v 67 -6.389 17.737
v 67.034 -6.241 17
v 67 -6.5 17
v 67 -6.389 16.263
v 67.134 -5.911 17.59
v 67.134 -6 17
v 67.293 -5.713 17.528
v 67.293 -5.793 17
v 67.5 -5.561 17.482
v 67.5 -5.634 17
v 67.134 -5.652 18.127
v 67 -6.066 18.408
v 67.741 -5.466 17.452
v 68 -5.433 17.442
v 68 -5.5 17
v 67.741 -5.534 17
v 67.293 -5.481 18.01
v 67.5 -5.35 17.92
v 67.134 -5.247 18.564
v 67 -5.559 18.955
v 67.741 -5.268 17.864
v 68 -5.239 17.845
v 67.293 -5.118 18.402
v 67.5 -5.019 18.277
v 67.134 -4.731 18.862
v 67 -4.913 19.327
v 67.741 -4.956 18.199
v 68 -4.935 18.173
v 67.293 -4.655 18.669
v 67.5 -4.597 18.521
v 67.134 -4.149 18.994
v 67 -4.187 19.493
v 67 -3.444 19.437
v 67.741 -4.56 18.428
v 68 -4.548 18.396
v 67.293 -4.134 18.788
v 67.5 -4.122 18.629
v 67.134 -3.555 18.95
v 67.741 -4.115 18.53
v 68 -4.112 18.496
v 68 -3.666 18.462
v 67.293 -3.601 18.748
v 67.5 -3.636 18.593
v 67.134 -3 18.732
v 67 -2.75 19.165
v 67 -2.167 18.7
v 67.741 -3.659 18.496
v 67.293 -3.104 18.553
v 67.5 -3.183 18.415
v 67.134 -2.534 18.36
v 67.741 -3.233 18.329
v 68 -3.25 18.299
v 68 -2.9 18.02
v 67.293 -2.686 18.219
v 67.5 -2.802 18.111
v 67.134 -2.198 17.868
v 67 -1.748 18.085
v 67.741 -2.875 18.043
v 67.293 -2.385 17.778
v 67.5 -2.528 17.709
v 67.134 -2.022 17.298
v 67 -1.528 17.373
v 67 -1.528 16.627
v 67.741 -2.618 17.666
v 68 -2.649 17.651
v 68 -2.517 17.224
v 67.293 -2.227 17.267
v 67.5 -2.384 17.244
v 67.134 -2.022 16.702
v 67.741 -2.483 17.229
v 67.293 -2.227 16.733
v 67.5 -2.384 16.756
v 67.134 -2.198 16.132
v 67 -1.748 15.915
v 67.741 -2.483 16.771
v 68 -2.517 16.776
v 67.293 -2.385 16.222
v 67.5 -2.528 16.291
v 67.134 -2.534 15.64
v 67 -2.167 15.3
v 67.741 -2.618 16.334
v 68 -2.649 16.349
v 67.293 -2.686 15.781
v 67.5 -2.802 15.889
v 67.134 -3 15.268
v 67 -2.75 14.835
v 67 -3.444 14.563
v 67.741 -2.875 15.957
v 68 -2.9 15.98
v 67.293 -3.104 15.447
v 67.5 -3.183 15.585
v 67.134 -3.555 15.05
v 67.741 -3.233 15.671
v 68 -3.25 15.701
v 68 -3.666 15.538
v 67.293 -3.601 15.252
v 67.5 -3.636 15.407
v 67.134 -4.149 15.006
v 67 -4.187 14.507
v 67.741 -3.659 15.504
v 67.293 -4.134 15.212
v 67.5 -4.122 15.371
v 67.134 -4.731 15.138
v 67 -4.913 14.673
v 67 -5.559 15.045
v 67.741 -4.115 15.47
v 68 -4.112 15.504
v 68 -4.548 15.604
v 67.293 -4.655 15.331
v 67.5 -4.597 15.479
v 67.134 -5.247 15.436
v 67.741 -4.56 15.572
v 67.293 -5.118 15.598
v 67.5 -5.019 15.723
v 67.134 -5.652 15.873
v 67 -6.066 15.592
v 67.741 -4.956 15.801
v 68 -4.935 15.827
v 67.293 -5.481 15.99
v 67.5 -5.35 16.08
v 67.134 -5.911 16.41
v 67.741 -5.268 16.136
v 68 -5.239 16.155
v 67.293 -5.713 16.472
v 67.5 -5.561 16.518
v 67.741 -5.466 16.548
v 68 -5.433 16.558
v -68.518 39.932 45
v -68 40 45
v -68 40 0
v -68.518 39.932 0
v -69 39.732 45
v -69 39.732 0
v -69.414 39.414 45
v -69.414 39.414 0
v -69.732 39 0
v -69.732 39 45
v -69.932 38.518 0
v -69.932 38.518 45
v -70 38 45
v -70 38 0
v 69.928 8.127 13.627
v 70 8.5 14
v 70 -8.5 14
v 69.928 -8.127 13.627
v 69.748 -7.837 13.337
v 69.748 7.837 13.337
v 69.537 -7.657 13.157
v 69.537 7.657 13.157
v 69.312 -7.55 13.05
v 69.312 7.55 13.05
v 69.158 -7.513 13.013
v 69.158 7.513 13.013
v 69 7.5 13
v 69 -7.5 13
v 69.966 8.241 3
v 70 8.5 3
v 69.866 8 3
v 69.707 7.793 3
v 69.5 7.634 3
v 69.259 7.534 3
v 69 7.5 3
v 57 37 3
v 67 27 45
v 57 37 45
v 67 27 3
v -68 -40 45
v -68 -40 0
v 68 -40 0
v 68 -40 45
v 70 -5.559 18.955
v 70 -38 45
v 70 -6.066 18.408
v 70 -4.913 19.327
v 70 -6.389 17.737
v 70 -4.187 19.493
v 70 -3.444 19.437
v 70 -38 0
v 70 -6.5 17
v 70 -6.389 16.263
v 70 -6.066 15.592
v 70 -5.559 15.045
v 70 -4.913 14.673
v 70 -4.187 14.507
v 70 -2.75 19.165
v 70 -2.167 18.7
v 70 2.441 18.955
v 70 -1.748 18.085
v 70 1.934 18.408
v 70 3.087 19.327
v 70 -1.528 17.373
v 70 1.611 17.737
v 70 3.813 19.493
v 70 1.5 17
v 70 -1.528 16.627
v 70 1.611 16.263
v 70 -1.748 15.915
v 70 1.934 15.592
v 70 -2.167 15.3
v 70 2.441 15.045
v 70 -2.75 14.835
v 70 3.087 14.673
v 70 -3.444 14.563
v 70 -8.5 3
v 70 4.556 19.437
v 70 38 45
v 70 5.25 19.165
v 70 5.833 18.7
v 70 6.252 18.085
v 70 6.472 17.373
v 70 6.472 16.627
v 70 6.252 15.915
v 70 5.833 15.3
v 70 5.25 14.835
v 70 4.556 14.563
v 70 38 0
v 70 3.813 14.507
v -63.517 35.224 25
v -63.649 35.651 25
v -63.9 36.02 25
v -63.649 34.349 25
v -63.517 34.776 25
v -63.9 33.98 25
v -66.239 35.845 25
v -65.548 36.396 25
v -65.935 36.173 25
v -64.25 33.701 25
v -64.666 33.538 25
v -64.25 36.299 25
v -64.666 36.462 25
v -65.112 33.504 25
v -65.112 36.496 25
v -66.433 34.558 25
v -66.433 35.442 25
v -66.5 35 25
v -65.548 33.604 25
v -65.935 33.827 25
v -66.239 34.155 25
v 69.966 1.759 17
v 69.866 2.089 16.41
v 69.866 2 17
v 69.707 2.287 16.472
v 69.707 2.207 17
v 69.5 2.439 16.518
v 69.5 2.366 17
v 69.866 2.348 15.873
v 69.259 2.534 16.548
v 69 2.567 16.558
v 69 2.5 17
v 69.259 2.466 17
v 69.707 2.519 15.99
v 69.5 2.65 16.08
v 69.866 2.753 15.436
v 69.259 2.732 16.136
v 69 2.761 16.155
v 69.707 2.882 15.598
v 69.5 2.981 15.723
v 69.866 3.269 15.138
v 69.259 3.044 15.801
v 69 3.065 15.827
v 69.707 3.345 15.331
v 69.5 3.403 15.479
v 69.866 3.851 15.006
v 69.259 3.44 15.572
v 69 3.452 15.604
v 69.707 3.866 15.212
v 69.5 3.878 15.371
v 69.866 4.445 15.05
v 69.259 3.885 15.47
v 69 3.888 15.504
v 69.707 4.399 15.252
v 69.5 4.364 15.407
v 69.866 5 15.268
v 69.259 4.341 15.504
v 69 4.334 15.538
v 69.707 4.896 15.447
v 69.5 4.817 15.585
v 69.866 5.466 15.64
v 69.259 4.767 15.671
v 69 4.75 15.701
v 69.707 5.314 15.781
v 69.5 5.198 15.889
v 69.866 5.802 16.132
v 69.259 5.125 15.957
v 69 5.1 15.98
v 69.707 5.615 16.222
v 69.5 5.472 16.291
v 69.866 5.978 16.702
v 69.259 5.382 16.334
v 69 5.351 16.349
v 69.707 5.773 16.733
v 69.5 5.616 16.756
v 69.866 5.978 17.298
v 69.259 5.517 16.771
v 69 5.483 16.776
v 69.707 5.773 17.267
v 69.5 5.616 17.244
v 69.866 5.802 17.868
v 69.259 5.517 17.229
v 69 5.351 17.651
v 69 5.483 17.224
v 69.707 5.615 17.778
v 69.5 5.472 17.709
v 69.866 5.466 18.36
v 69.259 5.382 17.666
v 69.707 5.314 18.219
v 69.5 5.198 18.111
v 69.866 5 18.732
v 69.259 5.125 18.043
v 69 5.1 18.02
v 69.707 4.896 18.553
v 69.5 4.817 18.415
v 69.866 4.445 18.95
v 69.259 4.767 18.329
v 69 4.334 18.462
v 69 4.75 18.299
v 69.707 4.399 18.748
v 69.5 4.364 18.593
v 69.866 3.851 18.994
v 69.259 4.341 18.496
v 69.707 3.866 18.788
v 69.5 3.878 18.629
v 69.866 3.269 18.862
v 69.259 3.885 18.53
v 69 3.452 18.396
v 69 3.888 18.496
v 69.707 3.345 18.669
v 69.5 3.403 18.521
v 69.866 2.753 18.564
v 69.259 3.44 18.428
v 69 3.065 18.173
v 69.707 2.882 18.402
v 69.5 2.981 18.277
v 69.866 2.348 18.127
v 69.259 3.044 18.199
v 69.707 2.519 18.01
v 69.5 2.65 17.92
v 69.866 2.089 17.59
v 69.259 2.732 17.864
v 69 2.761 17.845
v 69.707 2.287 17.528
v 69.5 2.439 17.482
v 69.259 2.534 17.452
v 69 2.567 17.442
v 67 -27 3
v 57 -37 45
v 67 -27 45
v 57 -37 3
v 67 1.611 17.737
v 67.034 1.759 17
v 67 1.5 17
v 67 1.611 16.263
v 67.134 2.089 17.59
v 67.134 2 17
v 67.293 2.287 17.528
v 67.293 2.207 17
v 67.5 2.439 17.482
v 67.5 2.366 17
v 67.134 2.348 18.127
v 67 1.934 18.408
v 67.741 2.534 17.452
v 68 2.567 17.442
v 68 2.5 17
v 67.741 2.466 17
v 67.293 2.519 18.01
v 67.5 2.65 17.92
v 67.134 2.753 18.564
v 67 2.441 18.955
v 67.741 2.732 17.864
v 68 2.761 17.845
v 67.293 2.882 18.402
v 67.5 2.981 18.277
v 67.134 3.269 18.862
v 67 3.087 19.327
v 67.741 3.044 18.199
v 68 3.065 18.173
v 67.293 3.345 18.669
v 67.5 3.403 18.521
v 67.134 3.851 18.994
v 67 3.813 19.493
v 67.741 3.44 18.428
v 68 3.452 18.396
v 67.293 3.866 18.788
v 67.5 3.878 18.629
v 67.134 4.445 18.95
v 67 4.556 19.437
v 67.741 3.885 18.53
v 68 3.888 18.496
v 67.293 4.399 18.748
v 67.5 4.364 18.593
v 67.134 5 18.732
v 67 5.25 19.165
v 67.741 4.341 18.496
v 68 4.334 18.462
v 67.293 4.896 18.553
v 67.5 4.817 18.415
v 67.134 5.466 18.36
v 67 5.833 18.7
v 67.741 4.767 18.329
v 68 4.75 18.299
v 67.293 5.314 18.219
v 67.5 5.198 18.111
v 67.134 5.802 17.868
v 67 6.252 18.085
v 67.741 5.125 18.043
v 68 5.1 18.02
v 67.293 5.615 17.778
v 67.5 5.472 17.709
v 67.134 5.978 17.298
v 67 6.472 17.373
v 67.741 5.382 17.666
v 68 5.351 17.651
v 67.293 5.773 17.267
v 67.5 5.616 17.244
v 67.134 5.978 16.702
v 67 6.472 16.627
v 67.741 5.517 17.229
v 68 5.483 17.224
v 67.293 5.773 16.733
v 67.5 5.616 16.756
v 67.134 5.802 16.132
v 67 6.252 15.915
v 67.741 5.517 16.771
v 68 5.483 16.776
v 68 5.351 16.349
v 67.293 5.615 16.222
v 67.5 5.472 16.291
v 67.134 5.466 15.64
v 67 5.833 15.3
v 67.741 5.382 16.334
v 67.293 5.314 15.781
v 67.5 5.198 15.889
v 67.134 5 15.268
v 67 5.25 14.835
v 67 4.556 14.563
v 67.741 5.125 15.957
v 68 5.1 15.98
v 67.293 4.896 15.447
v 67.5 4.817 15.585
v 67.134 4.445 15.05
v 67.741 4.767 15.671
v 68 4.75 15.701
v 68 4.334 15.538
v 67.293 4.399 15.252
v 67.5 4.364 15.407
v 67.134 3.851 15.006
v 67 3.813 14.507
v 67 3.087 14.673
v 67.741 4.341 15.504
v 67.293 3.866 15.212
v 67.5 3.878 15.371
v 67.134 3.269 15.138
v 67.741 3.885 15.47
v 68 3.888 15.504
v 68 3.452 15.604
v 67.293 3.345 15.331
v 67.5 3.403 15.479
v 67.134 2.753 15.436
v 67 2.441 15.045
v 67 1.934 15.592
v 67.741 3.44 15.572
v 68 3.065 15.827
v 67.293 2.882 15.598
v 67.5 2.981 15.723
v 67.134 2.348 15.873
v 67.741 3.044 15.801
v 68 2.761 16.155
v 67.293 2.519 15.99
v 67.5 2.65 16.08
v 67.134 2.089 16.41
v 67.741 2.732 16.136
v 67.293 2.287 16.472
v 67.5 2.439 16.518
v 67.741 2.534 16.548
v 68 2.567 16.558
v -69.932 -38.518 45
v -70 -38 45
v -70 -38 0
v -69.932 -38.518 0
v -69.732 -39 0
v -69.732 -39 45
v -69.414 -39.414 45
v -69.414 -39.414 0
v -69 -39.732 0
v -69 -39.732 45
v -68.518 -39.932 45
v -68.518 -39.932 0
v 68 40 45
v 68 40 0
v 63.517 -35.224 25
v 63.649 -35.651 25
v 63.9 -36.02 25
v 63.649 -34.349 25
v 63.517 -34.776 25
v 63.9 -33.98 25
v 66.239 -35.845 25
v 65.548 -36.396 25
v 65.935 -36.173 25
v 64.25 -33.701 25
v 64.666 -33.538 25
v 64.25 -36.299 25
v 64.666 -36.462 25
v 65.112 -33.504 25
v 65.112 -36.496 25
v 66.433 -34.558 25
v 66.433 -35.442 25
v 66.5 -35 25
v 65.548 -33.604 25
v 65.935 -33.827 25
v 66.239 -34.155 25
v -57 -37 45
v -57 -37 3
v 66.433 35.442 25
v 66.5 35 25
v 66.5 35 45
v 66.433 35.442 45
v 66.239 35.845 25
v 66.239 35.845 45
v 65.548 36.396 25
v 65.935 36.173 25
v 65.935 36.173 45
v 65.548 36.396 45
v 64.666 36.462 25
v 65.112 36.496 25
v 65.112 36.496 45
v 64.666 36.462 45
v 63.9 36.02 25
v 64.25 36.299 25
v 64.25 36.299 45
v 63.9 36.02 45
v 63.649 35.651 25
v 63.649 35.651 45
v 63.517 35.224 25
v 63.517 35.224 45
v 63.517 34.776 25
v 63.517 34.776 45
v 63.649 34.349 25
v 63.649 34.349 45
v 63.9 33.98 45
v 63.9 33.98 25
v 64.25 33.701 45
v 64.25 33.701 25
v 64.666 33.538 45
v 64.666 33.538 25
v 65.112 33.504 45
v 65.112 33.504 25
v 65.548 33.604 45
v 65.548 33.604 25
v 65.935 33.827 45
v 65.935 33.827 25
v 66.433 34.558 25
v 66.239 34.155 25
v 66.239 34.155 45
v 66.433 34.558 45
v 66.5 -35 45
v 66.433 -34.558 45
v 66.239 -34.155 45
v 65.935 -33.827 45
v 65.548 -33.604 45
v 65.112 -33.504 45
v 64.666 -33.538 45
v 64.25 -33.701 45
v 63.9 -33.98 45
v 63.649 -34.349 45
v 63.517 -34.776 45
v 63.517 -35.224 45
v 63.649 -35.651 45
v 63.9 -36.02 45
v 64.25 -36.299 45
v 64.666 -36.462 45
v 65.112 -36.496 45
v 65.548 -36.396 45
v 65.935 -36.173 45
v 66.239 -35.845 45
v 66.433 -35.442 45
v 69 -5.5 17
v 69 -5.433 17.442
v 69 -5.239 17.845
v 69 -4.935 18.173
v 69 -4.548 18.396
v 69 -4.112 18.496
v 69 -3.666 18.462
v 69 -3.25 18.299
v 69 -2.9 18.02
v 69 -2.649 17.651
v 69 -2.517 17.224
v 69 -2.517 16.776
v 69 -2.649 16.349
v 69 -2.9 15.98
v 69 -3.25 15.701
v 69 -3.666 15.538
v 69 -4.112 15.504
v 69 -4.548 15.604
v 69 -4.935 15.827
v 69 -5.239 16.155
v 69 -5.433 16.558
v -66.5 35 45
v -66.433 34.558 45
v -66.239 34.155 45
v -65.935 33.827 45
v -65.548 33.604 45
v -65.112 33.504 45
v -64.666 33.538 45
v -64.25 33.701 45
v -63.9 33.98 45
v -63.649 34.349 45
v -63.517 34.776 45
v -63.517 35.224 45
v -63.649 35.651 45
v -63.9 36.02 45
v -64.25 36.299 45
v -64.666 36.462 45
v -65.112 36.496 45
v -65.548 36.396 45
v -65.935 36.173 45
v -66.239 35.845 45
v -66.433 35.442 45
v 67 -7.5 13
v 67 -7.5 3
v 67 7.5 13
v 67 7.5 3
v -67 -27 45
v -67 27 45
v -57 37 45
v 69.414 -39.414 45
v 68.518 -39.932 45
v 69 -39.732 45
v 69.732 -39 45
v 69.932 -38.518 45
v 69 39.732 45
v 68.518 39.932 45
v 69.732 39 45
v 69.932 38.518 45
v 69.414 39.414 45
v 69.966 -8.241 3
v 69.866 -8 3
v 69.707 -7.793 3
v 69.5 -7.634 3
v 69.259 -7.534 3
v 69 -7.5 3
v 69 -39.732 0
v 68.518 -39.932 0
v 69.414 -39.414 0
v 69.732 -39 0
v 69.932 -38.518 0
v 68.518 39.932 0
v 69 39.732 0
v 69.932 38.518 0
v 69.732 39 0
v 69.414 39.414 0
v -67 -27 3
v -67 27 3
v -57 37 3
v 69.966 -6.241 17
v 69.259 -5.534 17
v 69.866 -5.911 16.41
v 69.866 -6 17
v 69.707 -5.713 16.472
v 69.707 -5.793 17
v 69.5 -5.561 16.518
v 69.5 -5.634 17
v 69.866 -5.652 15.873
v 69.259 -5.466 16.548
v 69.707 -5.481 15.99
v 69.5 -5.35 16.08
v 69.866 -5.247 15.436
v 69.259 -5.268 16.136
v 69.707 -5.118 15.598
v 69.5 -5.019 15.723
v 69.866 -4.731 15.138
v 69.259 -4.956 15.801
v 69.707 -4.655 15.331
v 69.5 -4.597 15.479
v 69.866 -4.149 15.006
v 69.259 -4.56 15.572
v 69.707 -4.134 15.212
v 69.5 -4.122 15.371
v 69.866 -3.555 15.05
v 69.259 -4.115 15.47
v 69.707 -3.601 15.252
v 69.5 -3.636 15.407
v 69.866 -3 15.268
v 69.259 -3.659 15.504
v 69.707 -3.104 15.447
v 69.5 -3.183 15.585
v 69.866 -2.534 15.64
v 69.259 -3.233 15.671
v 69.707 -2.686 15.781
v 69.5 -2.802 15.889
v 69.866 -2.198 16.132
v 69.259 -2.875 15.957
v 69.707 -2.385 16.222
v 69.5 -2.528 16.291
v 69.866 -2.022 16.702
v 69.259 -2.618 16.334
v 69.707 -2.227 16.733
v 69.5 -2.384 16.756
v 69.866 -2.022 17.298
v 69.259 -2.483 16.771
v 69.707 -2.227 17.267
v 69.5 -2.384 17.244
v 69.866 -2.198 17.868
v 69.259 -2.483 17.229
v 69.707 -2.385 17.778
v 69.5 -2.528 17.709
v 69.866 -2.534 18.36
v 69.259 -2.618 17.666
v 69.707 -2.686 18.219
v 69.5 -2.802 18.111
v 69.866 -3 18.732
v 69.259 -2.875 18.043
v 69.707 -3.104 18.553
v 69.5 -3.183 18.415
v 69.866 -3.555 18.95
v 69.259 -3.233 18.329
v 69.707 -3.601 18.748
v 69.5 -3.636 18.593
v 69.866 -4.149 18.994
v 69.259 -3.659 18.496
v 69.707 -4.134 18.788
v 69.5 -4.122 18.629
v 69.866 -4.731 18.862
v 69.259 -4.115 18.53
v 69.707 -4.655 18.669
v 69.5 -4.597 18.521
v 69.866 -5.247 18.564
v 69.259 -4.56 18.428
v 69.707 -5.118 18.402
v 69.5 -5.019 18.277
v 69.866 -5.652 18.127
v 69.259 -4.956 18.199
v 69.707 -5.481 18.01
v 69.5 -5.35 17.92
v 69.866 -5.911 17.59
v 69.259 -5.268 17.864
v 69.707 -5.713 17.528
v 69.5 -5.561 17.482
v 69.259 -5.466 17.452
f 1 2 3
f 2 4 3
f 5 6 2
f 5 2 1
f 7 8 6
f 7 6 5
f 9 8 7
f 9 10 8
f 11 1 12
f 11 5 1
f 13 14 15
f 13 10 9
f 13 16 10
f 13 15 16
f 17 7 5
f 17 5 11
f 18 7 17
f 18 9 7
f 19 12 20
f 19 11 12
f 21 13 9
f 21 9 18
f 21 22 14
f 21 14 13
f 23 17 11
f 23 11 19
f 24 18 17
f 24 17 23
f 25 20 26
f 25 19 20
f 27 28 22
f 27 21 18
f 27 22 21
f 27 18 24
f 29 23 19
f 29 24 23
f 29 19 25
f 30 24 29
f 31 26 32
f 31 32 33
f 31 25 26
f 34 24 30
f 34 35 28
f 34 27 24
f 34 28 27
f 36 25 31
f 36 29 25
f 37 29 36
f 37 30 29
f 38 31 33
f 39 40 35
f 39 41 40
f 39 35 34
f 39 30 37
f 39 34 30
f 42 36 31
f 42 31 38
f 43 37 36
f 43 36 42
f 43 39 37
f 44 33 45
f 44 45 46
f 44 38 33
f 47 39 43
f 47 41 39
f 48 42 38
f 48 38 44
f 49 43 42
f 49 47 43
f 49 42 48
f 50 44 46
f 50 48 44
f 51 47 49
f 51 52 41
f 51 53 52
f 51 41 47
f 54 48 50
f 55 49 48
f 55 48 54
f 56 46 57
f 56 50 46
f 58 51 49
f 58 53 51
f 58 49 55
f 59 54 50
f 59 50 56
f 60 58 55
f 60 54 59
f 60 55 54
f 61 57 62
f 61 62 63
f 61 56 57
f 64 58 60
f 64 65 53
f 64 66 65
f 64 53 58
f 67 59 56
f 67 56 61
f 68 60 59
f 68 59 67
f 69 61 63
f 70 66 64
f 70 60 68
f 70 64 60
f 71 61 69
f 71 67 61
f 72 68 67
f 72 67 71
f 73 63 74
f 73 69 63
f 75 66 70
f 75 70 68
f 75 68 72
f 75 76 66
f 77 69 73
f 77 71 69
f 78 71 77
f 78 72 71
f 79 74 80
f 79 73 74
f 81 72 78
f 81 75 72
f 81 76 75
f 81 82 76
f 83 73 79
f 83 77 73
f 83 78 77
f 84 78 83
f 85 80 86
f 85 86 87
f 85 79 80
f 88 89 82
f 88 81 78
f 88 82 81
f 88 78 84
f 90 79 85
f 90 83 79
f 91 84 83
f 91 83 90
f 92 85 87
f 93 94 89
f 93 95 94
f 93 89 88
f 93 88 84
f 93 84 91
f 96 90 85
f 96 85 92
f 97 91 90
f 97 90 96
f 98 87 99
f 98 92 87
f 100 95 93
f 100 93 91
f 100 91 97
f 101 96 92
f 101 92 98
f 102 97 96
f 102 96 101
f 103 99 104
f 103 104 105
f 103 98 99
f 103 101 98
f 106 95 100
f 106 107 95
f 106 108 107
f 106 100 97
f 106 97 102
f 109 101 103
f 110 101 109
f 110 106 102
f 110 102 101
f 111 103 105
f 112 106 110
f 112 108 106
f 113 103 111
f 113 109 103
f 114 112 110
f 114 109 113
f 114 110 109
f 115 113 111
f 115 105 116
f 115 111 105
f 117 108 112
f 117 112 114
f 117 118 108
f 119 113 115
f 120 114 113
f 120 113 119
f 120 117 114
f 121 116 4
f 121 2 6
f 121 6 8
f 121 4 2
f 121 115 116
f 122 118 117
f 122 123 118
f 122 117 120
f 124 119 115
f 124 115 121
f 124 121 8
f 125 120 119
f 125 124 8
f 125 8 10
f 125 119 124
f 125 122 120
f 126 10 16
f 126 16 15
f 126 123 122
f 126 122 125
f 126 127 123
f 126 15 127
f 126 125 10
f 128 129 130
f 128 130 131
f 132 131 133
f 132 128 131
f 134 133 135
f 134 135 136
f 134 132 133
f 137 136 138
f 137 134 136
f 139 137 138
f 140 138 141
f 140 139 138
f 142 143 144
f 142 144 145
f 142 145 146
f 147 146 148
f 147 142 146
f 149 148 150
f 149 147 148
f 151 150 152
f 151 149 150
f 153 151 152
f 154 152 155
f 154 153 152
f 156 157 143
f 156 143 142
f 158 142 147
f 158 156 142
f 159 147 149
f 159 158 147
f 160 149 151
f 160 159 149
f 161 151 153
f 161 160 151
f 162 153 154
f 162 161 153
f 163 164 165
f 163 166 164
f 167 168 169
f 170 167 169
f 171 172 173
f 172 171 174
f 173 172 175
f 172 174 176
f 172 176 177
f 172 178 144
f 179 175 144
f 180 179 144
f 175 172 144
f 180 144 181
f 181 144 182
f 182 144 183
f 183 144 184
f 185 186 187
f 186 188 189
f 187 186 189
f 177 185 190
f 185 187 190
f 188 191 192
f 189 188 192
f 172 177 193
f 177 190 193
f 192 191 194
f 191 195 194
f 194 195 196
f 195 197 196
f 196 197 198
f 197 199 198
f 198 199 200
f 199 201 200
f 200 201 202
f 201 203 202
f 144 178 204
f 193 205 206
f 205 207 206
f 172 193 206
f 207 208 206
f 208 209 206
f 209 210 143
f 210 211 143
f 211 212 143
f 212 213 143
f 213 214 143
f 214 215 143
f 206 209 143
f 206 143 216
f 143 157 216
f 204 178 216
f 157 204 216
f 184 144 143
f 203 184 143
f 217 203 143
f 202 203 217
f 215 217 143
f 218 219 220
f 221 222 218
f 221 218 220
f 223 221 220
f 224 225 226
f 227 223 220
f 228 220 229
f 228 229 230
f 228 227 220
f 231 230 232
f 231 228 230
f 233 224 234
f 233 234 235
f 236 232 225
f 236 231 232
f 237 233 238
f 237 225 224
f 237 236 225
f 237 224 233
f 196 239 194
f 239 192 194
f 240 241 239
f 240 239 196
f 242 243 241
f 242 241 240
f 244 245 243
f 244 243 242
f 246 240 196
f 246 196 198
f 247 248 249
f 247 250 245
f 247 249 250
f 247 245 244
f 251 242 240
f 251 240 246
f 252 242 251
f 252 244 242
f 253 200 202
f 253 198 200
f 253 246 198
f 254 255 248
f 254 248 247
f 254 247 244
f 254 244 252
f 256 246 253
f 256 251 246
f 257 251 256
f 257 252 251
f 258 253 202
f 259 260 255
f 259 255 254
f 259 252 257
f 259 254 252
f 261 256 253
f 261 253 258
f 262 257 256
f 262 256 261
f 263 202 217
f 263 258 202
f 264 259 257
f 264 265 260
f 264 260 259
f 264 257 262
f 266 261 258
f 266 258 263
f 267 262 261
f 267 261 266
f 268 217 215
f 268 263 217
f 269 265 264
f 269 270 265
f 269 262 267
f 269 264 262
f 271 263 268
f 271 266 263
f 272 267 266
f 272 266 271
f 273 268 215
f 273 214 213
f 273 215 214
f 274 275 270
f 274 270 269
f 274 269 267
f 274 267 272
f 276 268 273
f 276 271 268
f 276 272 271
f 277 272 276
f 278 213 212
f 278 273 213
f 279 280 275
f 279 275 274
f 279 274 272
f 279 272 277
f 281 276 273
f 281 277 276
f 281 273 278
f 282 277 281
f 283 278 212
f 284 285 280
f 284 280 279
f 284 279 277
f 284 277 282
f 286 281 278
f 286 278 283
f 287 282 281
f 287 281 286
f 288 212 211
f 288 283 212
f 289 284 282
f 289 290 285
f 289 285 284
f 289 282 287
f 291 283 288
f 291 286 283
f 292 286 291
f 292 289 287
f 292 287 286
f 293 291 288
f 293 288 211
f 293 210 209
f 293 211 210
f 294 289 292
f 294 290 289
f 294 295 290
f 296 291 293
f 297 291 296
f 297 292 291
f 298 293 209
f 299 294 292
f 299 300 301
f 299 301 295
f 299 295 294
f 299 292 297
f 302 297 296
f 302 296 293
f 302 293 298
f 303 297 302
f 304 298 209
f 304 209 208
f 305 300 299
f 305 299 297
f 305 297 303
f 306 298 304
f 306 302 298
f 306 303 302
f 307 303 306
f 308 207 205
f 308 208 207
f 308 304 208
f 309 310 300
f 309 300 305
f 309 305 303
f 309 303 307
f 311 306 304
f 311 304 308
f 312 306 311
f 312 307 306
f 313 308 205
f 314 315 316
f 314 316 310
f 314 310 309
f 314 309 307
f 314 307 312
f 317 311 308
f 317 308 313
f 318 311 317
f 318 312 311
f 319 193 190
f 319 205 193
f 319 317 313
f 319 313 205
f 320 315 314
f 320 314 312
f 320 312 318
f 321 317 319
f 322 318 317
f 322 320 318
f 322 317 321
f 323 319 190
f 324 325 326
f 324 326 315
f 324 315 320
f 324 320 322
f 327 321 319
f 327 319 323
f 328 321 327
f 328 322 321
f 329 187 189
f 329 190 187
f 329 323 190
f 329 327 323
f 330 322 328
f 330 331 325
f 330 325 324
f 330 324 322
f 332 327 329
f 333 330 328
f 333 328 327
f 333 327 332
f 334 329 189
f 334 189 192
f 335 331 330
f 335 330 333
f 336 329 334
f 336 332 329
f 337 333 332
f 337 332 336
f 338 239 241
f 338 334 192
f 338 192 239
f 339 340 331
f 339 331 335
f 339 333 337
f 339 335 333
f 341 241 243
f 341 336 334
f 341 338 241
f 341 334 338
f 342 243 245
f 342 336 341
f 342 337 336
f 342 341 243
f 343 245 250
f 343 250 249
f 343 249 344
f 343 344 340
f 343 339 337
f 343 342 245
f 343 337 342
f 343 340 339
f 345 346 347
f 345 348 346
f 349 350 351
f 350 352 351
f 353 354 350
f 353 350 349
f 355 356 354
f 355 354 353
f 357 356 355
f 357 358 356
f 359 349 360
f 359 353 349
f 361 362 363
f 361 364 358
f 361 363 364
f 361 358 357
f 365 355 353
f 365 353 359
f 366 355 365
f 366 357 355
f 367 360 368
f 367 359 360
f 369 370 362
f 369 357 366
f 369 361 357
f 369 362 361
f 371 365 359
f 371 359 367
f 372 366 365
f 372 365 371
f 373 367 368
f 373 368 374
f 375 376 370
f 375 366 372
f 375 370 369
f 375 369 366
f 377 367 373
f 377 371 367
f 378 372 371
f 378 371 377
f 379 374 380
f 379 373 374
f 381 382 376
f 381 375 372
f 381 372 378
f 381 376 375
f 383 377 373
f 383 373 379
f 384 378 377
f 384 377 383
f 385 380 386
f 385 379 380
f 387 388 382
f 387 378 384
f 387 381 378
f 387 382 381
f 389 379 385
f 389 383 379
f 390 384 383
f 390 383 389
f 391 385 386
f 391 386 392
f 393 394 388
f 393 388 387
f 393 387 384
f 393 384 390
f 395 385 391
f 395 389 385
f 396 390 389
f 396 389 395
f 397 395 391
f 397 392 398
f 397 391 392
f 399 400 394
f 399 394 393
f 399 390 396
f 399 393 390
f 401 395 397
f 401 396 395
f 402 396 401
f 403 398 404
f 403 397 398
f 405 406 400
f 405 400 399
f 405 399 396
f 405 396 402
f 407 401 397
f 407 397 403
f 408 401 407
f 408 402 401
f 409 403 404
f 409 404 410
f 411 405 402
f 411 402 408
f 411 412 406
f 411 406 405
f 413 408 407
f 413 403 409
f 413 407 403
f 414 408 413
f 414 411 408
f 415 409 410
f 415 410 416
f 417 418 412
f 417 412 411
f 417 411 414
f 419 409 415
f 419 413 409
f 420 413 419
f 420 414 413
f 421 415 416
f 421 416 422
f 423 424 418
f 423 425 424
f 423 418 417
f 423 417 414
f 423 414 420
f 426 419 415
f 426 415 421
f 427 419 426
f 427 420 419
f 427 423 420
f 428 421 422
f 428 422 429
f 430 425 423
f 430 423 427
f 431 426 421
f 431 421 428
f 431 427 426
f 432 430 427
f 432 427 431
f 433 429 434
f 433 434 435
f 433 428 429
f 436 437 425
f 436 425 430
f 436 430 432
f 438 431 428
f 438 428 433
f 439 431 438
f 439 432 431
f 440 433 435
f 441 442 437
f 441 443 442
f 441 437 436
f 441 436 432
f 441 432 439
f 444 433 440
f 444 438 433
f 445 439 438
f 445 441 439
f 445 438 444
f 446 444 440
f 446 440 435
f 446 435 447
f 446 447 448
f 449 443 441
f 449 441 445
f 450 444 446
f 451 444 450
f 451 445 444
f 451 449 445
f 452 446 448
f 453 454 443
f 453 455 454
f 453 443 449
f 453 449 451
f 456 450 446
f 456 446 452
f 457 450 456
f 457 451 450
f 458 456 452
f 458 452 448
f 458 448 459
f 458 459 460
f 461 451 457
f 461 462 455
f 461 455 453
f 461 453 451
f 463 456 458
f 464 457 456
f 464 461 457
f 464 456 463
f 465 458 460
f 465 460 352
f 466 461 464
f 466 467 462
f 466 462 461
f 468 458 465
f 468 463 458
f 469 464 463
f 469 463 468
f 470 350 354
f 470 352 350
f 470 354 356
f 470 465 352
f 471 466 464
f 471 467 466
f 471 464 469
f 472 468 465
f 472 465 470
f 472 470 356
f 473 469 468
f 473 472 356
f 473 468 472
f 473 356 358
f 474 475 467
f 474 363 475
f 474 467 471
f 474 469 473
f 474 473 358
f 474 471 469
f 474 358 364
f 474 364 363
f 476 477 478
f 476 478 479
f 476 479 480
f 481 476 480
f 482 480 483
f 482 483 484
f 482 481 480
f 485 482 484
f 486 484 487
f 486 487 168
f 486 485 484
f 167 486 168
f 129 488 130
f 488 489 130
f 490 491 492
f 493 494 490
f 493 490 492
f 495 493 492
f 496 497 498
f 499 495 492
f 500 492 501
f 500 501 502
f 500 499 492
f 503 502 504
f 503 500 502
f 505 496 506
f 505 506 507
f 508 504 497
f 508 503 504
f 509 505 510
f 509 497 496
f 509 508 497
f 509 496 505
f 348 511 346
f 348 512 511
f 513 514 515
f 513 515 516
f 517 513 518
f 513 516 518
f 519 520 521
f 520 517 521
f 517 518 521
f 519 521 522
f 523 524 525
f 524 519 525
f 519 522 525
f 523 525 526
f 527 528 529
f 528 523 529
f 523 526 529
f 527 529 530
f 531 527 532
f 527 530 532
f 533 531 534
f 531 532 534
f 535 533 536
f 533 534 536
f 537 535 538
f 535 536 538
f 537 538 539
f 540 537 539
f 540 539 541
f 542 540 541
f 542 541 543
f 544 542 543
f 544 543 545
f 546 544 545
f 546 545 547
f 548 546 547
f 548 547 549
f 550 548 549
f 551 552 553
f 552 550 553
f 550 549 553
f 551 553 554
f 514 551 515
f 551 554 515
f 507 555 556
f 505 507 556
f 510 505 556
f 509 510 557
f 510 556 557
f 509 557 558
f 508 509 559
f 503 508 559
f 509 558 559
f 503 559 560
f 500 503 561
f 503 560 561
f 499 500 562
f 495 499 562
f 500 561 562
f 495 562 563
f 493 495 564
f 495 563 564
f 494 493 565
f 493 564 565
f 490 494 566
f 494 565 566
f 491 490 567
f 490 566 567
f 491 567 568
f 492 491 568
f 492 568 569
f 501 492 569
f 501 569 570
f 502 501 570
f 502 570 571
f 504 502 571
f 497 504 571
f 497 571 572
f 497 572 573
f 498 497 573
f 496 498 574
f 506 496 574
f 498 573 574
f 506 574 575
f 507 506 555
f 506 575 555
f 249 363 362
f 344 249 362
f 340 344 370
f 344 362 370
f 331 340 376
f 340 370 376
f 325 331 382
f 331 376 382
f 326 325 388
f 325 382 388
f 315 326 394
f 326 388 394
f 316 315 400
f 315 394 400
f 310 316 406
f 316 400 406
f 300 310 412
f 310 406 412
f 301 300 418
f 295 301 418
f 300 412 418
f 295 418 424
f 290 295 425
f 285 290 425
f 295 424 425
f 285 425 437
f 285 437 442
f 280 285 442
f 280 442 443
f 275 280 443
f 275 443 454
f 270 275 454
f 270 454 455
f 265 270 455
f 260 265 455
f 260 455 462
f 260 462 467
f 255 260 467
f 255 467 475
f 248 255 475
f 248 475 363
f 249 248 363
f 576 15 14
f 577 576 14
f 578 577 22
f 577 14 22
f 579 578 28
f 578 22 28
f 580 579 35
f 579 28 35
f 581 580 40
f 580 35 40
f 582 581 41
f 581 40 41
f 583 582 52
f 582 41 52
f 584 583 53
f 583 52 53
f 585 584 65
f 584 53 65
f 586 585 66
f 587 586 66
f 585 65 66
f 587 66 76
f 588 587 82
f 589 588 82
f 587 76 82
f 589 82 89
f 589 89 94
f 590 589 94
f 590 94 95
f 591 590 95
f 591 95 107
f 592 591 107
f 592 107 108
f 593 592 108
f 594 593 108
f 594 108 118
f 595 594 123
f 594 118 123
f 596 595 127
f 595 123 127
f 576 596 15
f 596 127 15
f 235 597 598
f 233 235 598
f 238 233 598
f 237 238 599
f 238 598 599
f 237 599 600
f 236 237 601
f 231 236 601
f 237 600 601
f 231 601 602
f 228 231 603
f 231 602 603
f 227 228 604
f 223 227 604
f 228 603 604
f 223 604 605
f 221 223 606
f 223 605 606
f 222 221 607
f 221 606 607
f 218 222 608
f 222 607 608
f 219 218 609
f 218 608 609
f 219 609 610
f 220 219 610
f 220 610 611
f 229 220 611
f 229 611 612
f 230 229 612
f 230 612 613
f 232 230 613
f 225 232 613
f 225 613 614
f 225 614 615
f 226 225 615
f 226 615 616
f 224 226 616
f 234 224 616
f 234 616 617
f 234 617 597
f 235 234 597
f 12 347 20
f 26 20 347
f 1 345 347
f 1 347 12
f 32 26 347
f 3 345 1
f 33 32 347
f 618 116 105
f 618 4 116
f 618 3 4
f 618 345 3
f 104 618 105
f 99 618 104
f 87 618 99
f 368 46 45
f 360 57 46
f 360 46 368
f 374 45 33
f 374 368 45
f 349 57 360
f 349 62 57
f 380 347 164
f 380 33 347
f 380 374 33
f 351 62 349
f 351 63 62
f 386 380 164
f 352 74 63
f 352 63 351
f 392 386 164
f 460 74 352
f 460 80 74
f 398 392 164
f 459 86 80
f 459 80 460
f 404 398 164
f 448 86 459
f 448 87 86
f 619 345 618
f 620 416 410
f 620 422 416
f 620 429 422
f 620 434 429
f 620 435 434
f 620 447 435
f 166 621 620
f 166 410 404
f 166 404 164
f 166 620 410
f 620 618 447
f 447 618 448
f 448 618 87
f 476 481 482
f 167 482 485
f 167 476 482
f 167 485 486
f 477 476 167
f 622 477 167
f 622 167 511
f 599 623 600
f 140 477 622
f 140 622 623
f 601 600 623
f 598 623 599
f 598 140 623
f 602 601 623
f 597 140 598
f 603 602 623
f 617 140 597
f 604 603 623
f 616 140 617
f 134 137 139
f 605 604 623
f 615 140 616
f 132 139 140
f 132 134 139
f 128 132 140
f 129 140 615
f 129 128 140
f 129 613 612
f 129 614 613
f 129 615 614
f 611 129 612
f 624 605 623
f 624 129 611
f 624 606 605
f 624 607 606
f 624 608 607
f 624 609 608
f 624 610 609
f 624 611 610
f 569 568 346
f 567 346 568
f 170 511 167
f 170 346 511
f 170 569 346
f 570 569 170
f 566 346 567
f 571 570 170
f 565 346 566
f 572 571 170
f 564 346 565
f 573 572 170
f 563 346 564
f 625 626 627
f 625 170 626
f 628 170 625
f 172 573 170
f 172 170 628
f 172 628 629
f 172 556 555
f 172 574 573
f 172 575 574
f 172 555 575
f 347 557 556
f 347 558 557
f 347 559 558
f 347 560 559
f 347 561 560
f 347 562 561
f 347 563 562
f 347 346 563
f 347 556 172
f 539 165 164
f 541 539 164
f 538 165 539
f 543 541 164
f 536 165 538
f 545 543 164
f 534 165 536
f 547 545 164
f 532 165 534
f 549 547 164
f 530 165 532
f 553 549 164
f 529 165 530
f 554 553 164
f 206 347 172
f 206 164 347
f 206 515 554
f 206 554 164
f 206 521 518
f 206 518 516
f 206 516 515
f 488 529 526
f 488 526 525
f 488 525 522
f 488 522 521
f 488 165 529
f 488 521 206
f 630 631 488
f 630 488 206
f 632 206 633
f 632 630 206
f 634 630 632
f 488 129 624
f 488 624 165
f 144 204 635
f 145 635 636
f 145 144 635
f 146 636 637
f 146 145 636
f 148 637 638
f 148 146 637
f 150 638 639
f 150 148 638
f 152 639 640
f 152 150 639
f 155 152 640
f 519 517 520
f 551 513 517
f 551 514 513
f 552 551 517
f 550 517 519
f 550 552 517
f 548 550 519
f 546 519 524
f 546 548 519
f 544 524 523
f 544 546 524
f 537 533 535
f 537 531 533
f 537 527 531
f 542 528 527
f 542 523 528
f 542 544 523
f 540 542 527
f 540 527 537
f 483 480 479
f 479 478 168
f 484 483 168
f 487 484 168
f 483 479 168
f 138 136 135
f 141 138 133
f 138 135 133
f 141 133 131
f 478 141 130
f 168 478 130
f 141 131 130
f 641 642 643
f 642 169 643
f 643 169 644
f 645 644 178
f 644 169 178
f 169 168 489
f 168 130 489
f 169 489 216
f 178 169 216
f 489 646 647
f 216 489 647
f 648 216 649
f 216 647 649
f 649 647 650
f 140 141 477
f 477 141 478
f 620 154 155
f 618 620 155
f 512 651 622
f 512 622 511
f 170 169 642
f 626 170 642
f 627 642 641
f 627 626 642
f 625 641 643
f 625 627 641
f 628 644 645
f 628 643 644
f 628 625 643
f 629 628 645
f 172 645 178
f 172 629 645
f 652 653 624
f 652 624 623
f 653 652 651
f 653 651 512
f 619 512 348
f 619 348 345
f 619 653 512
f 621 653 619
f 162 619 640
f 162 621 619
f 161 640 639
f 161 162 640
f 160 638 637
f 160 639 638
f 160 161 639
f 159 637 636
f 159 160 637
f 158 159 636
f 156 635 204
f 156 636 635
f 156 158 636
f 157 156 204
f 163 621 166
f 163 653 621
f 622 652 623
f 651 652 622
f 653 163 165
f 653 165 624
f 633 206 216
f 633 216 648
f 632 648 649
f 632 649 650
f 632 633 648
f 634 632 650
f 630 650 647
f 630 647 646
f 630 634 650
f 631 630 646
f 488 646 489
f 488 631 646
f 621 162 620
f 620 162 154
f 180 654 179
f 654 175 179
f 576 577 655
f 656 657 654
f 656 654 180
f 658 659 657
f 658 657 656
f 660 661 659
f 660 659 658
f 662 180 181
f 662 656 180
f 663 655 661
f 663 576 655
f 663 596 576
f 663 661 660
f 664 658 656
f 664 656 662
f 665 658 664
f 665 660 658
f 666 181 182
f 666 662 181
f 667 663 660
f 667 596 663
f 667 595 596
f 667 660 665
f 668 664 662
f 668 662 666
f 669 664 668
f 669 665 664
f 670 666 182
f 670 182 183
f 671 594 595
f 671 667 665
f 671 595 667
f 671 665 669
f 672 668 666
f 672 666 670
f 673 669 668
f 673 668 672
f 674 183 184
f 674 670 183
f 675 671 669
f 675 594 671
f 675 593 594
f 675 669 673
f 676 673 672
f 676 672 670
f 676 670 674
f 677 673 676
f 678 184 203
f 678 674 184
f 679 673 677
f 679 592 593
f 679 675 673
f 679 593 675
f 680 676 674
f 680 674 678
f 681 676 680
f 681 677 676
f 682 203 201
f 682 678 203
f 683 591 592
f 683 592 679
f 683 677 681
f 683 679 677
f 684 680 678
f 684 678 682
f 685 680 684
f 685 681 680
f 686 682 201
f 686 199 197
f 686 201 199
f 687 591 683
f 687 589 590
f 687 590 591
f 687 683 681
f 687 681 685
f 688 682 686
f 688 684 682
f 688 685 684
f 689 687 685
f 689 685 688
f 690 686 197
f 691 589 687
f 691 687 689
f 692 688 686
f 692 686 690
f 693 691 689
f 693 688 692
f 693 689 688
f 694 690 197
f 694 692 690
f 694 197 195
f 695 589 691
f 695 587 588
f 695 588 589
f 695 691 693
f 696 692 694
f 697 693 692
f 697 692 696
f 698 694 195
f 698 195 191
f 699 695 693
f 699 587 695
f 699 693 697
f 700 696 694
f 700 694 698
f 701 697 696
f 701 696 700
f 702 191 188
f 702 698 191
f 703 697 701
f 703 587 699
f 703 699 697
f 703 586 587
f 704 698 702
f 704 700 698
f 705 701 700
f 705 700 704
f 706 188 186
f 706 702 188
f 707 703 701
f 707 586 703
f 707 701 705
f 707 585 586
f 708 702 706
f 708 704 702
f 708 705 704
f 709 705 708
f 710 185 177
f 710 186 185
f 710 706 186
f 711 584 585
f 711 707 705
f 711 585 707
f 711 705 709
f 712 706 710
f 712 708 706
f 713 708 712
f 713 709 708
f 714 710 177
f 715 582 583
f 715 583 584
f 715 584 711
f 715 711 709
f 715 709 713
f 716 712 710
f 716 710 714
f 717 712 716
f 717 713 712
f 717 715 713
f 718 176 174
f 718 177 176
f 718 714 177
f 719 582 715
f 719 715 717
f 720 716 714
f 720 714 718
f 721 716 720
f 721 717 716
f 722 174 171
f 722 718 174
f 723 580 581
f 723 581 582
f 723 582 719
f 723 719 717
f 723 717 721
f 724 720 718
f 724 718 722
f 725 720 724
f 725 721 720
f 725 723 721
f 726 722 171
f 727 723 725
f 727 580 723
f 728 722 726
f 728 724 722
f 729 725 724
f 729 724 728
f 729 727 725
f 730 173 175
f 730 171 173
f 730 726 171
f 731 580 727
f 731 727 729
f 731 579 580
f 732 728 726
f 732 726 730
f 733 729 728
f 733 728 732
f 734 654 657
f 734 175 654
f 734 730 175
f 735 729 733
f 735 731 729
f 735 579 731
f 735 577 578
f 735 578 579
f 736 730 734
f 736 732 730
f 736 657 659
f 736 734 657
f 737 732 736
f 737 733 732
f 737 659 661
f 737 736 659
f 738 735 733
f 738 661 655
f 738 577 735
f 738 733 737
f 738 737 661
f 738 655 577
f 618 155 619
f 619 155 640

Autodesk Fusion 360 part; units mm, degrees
sketch "Sketch1" plane through (0, 0, 0) normal (0, 0, 1) x (1, 0, 0)
  line L0 (67, 37) -> (-67, 37)
  line L1 (-67, 37) -> (-67, -37)
  line L2 (-67, -37) -> (67, -37)
  line L3 (67, -37) -> (67, 37)
  line L4 (67, 37) -> (-67, -37) construction
  line L5 (-67, 37) -> (67, -37) construction
  line L6 (70, 40) -> (-70, 40)
  line L7 (-70, 40) -> (-70, -40)
  line L8 (-70, -40) -> (70, -40)
  line L9 (70, -40) -> (70, 40)
  line L10 (70, 40) -> (-70, -40) construction
  line L11 (-70, 40) -> (70, -40) construction
  dimension "d1" = 3
  dimension "d2" = 3
  dimension "d3" = 140
  dimension "d4" = 80
extrude "Extrude1" add sketch "Sketch1" along normal blind 45
sketch "Sketch2" plane through (0, 0, 0) normal (0, 0, 1) x (1, 0, 0)
  line L0 (-67, 37) -> (67, 37)
  line L1 (67, 37) -> (67, -37)
  line L2 (67, -37) -> (-67, -37)
  line L3 (-67, -37) -> (-67, 37)
  point P0 (-67, 37)
  point P1 (67, -37)
extrude "Extrude2" add sketch "Sketch2" along normal blind 3
sketch "Sketch3" plane through (0, 0, 3) normal (0, 0, 1) x (-1, 0, 0)
  line L0 (67, 37) -> (-67, 37)
  line L1 (-67, 37) -> (-67, -37)
  line L2 (-67, -37) -> (67, -37)
  line L3 (67, -37) -> (67, 37)
  line L4 (57, -37) -> (67, -27)
  line L5 (67, -27) -> (67, -37)
  line L6 (57, -37) -> (67, -37)
  dimension "d11" = 10
  dimension "d12" = 10
extrude "Extrude3" add sketch "Sketch3" along normal up to surface (42 mm away) contours L2 L3 L4 L5 L6
sketch "Sketch5" plane through (0, 0, 45) normal (0, 0, 1) x (-1, 0, 0)
  line L0 (-67, -37) -> (-67, 37)
  line L1 (-67, 37) -> (67, 37)
  line L2 (67, 37) -> (67, -27)
  line L3 (67, -27) -> (57, -37)
  line L4 (57, -37) -> (-67, -37)
  line L5 (-70, 40) -> (-70, -40)
  line L6 (-70, -40) -> (70, -40)
  line L7 (70, -40) -> (70, 40)
  line L8 (70, 40) -> (-70, 40)
  circle A0 centre (65, -35) radius 1.5
  line L9 (0, -1.75) -> (0, -22.5)
  line L10 (-1.75, 0) -> (-22.5, 0)
  dimension "d18" = 3
  dimension "d19" = 65
  dimension "d20" = 35
extrude "Extrude5" cut sketch "Sketch5" against normal blind 20 contours A0
mirror "Mirror1" about plane through (0, 0, 0) normal (1, 0, 0) of "Extrude3", "Extrude5"
mirror "Mirror2" about plane through (0, 0, 0) normal (0, 1, 0) of "Mirror1", "Extrude5", "Extrude3"
sketch "Sketch6" plane through (67, 0, 0) normal (-1, 0, 0) x (0, -1, 0)
  line L0 (27, 3) -> (27, 45)
  line L1 (27, 45) -> (-27, 45)
  line L2 (-27, 45) -> (-27, 3)
  line L3 (-27, 3) -> (27, 3)
  line L4 (7.5, 3) -> (-7.5, 3)
  line L5 (-7.5, 3) -> (-7.5, 13)
  line L6 (-7.5, 13) -> (7.5, 13)
  line L7 (7.5, 13) -> (7.5, 3)
  line L8 (7.5, 3) -> (-7.5, 13) construction
  line L9 (-7.5, 3) -> (7.5, 13) construction
  line L10 (-27, 15.2846) -> (0, 15.2846) construction
  line L11 (0, 15.2846) -> (27, 15.2846) construction
  circle A0 centre (-4, 17) radius 1.5
  line L12 (0, 2.5) -> (0, 20)
  circle A1 centre (4, 17) radius 1.5
  point P0 (0, 8)
  dimension "d27" = 10
  dimension "d28" = 15
  dimension "d29" = 3
  dimension "d30" = 4
  dimension "d31" = 4
extrude "Extrude6" cut sketch "Sketch6" along normal mid plane 20 contours L3 L4 L6 L7 L12 | L3 L4 L5 L6 L12 | A0 | A1
fillet "Fillet1" radius 2 4 edges at (70, -40, 22.5) (70, 40, 22.5) (-70, 40, 22.5) (-70, -40, 22.5)
fillet "Fillet2" radius 1 5 edges at (70, 0, 13) (70, -7.5, 8) (70, 7.5, 8) (70, 5.3985, 16.4576) (67, 5.3985, 17.5424) 1 faces at (68, -5.4925, 16.8506)
